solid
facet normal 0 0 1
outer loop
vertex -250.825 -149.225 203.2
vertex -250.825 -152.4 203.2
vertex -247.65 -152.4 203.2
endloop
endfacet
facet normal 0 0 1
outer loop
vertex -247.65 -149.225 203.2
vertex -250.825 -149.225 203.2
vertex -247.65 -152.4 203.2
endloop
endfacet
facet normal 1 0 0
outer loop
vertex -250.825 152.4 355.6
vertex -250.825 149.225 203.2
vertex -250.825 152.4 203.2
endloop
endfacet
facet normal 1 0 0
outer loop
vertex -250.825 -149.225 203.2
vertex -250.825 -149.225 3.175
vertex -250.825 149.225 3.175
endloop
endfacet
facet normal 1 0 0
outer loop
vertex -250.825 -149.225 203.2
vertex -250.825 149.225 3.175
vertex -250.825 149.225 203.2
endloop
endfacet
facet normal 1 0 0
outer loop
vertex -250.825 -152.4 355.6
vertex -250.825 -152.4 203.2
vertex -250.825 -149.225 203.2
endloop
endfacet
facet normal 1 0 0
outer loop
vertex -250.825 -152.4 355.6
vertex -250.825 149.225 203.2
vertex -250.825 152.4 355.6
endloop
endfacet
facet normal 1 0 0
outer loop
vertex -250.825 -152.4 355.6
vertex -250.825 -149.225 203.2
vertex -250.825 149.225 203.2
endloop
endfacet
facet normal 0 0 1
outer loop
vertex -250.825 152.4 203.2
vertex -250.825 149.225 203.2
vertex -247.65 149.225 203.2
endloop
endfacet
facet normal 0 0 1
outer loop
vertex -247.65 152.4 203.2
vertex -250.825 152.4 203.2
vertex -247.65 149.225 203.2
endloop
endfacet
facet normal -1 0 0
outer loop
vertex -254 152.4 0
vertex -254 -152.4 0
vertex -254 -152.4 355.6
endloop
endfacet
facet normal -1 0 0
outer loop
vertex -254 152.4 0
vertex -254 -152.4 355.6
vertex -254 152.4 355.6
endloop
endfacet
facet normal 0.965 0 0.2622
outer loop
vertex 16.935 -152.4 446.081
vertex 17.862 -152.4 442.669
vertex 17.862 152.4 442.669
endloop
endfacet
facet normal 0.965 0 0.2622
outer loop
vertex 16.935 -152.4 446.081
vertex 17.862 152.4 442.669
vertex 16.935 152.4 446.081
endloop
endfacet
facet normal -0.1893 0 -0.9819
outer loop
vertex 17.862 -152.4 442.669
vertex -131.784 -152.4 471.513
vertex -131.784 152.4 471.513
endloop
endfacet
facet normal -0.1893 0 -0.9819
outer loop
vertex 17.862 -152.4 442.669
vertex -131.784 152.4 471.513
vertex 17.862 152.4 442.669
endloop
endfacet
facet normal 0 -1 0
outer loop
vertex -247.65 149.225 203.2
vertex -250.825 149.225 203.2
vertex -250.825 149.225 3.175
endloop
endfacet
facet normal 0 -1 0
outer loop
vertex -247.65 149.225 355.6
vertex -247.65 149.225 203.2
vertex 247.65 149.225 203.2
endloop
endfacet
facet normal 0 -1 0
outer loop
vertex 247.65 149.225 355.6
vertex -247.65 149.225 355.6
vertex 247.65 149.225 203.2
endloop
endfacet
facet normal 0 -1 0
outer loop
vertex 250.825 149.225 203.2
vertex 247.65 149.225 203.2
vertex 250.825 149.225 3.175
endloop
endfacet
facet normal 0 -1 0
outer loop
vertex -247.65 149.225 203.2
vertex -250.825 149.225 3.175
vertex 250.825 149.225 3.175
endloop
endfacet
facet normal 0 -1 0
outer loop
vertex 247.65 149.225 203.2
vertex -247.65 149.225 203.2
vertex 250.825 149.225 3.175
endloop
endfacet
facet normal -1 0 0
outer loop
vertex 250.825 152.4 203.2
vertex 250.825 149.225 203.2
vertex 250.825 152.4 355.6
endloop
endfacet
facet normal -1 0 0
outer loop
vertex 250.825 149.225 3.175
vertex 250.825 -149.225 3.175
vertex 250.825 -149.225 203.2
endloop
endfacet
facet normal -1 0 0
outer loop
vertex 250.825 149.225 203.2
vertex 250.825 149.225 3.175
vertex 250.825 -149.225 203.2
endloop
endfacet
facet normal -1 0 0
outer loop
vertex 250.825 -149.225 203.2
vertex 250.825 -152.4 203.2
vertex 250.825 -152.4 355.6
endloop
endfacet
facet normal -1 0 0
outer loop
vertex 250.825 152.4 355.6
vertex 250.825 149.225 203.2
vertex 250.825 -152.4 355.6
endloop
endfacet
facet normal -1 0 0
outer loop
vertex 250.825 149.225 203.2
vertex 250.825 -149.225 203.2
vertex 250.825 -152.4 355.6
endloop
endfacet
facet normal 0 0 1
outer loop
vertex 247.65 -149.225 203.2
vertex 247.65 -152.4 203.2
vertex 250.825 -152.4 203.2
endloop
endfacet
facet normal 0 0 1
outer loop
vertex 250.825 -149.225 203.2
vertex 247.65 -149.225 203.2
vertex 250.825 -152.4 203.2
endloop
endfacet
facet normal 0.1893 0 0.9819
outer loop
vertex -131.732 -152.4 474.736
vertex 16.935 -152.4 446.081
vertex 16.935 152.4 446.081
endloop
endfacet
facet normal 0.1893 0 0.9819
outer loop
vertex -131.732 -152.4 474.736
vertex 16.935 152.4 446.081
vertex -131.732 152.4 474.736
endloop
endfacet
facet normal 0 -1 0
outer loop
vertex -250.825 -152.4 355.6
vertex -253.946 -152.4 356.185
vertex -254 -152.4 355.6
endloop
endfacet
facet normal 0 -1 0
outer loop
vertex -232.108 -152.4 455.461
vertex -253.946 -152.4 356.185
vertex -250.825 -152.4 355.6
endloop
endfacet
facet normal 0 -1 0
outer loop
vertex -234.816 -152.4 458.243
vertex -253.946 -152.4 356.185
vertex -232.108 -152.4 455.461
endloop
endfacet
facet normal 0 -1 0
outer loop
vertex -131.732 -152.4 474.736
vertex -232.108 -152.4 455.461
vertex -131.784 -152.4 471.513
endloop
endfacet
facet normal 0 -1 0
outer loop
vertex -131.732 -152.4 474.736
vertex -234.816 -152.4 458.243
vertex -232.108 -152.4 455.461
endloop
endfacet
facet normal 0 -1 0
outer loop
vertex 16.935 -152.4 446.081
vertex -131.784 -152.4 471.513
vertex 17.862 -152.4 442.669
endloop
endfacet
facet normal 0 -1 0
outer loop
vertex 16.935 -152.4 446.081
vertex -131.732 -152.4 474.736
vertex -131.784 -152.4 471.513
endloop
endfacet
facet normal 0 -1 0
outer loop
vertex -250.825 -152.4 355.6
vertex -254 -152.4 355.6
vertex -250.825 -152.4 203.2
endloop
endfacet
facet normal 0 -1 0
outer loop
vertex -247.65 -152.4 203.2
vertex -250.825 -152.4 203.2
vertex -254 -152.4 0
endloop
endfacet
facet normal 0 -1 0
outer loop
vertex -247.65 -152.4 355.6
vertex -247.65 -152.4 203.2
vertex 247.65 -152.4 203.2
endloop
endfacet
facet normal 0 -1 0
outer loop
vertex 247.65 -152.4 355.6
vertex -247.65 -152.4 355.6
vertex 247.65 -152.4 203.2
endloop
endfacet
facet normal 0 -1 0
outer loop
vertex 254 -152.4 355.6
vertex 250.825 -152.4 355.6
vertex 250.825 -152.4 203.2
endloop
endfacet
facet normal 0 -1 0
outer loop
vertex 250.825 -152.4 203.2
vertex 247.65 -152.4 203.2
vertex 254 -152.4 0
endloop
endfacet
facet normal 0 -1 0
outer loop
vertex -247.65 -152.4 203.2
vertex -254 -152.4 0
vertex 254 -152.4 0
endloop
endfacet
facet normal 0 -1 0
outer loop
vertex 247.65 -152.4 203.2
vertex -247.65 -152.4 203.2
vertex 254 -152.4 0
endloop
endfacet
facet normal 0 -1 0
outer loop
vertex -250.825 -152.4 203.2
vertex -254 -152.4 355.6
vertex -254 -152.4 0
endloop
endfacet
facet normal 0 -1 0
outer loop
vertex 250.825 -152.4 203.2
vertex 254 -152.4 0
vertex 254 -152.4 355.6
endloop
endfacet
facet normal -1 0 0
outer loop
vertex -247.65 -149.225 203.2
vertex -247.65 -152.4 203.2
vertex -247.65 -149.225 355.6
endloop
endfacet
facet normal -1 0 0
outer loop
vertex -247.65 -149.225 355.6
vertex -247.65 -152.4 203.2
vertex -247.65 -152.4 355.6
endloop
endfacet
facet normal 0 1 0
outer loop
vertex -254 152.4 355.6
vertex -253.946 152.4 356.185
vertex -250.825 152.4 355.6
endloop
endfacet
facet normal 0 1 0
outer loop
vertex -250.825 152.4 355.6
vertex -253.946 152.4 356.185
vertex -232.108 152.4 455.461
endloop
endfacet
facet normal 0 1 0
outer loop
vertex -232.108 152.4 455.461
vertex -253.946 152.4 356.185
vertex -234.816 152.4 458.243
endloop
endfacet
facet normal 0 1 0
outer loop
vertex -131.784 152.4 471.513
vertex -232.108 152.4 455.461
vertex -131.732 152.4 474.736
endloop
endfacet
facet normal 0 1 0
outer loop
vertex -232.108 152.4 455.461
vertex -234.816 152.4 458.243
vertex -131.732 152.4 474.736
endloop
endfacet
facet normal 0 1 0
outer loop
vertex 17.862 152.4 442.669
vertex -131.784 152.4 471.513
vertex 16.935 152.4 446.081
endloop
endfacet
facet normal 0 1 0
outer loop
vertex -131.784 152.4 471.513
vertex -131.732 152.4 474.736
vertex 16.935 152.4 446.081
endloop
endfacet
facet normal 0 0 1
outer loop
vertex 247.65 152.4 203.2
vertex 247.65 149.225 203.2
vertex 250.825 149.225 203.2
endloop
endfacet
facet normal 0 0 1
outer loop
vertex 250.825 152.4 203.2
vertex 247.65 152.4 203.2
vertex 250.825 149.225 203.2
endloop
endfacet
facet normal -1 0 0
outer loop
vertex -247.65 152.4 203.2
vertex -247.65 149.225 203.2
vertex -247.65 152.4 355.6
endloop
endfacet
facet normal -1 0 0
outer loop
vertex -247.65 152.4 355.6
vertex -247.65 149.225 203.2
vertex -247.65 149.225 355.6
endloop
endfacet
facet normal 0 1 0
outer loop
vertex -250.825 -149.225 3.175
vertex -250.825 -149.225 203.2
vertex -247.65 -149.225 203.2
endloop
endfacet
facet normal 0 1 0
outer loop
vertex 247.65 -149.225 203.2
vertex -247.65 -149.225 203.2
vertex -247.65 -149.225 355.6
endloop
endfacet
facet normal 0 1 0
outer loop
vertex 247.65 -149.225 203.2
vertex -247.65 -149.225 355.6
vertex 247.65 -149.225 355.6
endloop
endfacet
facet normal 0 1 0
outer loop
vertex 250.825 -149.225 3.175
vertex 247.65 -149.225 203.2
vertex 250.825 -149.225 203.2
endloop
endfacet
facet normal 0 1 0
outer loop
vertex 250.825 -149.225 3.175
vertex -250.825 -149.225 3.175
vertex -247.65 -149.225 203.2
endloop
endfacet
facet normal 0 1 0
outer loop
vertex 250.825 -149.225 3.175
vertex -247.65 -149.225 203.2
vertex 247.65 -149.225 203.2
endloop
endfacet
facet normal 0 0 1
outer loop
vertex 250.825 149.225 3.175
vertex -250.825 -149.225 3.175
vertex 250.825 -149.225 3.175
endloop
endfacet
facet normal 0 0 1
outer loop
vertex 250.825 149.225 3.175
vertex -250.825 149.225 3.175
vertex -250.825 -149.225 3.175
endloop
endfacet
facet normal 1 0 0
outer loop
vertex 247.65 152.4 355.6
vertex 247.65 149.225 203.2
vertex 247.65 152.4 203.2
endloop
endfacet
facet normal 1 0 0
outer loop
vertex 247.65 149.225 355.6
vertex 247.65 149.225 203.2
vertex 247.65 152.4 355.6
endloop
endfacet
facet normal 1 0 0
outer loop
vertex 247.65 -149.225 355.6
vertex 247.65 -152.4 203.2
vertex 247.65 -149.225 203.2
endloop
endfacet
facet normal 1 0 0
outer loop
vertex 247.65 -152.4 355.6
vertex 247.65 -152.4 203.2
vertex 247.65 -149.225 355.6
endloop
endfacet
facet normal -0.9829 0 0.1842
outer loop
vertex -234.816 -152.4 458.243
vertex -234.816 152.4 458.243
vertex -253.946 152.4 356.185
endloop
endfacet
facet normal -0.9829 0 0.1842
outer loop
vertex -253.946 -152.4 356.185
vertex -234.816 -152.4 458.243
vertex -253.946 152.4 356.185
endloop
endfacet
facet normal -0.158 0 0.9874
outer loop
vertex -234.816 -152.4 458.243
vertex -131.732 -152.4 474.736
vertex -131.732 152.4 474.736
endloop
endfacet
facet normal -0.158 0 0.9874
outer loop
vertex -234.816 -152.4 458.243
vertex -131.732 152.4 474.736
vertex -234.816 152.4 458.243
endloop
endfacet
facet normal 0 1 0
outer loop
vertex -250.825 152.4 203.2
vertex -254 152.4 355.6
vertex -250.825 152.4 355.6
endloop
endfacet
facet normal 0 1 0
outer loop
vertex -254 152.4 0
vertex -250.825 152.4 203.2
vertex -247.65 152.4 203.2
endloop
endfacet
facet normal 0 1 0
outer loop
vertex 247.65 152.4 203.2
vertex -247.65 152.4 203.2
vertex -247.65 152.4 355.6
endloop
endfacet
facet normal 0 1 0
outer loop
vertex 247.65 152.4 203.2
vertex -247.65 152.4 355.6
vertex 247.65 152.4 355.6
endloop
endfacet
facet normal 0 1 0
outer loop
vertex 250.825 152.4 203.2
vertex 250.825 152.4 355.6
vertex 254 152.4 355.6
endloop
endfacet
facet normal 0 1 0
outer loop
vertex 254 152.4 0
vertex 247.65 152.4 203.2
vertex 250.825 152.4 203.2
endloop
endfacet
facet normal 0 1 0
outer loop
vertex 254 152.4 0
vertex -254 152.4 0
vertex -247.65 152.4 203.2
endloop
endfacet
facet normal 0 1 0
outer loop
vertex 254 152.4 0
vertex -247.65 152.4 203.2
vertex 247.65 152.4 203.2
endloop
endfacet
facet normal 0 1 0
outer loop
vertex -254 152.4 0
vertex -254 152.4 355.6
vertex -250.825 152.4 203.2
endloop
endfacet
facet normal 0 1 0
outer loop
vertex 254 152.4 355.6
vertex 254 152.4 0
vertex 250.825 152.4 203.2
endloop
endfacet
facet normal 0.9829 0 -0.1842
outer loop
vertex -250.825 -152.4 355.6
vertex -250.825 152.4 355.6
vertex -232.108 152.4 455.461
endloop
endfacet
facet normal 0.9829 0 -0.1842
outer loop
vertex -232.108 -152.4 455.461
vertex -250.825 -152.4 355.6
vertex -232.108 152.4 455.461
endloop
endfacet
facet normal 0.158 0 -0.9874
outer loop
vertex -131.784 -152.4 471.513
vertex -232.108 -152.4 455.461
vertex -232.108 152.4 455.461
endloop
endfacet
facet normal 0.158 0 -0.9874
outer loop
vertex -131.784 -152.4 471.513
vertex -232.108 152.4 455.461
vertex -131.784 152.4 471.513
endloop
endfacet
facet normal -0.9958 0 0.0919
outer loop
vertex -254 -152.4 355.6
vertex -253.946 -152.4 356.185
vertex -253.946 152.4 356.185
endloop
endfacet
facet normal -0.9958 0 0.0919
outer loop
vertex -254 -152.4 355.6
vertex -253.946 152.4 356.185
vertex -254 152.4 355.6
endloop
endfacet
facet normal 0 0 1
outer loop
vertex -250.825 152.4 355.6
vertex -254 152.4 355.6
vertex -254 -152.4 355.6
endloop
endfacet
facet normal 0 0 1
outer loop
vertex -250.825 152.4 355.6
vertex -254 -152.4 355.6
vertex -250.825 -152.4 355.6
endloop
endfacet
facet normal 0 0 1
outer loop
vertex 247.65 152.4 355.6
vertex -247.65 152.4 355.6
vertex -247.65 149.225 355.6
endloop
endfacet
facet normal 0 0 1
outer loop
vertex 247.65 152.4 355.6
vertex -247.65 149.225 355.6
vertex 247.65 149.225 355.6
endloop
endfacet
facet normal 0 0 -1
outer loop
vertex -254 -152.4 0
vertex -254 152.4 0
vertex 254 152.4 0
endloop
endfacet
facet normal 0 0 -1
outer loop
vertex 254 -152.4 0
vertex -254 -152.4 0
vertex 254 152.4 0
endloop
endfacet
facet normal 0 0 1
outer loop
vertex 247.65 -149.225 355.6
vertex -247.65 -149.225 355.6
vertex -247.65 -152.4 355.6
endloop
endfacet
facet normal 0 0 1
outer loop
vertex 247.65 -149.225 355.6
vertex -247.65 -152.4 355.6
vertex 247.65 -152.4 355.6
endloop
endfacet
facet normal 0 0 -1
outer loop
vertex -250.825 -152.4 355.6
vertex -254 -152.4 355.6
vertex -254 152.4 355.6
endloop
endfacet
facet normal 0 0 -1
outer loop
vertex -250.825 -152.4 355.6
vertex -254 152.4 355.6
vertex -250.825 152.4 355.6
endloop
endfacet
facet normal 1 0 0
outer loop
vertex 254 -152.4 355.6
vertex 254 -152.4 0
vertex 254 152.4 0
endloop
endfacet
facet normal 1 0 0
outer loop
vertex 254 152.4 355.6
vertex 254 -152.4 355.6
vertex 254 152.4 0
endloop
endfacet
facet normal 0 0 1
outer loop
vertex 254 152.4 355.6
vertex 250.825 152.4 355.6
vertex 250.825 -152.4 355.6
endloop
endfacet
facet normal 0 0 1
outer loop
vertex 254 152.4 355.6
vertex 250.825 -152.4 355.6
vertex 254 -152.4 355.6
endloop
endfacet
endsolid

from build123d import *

# Parameters (mm, degrees)
F0_W     = 508
F0_H     = 304.8
F1_DEPTH = 355.6
F2_T     = -3.175
F3_W     = 3.175
F3_H     = 152.4
F4_DEPTH = 304.801
F6_DEPTH = 304.8


with BuildPart() as f1:
    # F0 (on Top) → F1 (new body)
    with BuildSketch(Plane.XY):
        Rectangle(F0_W, F0_H)
    extrude(amount=F1_DEPTH)

    # F2
    f2_openings = [f1.faces().sort_by_distance(p)[0] for p in [
        (0, 0, 355.6),
    ]]
    offset(amount=F2_T, openings=f2_openings)

    # F3 (on face) → F4 (cut, through all)
    with BuildSketch(Plane.XZ.offset(152.4)):
        with Locations((-249.2375, 279.4)):
            Rectangle(F3_W, F3_H)
        with Locations((249.2375, 279.4)):
            Rectangle(F3_W, F3_H)
    extrude(amount=-F4_DEPTH, mode=Mode.SUBTRACT)


with BuildPart() as f6:
    # F5 (on face) → F6 (new body)
    with BuildSketch(Plane.XZ.offset(152.4)):
        Polygon((-254, 355.6), (-250.825, 355.6), (-232.107642, 455.461006), (-131.783677, 471.512858), (17.861943, 442.669342), (16.934914, 446.081462), (-131.73249, 474.736431), (-234.816497, 458.242972), (-253.945656, 356.184917), align=None)
    extrude(amount=-F6_DEPTH)


solid = Compound([f1.part, f6.part])
